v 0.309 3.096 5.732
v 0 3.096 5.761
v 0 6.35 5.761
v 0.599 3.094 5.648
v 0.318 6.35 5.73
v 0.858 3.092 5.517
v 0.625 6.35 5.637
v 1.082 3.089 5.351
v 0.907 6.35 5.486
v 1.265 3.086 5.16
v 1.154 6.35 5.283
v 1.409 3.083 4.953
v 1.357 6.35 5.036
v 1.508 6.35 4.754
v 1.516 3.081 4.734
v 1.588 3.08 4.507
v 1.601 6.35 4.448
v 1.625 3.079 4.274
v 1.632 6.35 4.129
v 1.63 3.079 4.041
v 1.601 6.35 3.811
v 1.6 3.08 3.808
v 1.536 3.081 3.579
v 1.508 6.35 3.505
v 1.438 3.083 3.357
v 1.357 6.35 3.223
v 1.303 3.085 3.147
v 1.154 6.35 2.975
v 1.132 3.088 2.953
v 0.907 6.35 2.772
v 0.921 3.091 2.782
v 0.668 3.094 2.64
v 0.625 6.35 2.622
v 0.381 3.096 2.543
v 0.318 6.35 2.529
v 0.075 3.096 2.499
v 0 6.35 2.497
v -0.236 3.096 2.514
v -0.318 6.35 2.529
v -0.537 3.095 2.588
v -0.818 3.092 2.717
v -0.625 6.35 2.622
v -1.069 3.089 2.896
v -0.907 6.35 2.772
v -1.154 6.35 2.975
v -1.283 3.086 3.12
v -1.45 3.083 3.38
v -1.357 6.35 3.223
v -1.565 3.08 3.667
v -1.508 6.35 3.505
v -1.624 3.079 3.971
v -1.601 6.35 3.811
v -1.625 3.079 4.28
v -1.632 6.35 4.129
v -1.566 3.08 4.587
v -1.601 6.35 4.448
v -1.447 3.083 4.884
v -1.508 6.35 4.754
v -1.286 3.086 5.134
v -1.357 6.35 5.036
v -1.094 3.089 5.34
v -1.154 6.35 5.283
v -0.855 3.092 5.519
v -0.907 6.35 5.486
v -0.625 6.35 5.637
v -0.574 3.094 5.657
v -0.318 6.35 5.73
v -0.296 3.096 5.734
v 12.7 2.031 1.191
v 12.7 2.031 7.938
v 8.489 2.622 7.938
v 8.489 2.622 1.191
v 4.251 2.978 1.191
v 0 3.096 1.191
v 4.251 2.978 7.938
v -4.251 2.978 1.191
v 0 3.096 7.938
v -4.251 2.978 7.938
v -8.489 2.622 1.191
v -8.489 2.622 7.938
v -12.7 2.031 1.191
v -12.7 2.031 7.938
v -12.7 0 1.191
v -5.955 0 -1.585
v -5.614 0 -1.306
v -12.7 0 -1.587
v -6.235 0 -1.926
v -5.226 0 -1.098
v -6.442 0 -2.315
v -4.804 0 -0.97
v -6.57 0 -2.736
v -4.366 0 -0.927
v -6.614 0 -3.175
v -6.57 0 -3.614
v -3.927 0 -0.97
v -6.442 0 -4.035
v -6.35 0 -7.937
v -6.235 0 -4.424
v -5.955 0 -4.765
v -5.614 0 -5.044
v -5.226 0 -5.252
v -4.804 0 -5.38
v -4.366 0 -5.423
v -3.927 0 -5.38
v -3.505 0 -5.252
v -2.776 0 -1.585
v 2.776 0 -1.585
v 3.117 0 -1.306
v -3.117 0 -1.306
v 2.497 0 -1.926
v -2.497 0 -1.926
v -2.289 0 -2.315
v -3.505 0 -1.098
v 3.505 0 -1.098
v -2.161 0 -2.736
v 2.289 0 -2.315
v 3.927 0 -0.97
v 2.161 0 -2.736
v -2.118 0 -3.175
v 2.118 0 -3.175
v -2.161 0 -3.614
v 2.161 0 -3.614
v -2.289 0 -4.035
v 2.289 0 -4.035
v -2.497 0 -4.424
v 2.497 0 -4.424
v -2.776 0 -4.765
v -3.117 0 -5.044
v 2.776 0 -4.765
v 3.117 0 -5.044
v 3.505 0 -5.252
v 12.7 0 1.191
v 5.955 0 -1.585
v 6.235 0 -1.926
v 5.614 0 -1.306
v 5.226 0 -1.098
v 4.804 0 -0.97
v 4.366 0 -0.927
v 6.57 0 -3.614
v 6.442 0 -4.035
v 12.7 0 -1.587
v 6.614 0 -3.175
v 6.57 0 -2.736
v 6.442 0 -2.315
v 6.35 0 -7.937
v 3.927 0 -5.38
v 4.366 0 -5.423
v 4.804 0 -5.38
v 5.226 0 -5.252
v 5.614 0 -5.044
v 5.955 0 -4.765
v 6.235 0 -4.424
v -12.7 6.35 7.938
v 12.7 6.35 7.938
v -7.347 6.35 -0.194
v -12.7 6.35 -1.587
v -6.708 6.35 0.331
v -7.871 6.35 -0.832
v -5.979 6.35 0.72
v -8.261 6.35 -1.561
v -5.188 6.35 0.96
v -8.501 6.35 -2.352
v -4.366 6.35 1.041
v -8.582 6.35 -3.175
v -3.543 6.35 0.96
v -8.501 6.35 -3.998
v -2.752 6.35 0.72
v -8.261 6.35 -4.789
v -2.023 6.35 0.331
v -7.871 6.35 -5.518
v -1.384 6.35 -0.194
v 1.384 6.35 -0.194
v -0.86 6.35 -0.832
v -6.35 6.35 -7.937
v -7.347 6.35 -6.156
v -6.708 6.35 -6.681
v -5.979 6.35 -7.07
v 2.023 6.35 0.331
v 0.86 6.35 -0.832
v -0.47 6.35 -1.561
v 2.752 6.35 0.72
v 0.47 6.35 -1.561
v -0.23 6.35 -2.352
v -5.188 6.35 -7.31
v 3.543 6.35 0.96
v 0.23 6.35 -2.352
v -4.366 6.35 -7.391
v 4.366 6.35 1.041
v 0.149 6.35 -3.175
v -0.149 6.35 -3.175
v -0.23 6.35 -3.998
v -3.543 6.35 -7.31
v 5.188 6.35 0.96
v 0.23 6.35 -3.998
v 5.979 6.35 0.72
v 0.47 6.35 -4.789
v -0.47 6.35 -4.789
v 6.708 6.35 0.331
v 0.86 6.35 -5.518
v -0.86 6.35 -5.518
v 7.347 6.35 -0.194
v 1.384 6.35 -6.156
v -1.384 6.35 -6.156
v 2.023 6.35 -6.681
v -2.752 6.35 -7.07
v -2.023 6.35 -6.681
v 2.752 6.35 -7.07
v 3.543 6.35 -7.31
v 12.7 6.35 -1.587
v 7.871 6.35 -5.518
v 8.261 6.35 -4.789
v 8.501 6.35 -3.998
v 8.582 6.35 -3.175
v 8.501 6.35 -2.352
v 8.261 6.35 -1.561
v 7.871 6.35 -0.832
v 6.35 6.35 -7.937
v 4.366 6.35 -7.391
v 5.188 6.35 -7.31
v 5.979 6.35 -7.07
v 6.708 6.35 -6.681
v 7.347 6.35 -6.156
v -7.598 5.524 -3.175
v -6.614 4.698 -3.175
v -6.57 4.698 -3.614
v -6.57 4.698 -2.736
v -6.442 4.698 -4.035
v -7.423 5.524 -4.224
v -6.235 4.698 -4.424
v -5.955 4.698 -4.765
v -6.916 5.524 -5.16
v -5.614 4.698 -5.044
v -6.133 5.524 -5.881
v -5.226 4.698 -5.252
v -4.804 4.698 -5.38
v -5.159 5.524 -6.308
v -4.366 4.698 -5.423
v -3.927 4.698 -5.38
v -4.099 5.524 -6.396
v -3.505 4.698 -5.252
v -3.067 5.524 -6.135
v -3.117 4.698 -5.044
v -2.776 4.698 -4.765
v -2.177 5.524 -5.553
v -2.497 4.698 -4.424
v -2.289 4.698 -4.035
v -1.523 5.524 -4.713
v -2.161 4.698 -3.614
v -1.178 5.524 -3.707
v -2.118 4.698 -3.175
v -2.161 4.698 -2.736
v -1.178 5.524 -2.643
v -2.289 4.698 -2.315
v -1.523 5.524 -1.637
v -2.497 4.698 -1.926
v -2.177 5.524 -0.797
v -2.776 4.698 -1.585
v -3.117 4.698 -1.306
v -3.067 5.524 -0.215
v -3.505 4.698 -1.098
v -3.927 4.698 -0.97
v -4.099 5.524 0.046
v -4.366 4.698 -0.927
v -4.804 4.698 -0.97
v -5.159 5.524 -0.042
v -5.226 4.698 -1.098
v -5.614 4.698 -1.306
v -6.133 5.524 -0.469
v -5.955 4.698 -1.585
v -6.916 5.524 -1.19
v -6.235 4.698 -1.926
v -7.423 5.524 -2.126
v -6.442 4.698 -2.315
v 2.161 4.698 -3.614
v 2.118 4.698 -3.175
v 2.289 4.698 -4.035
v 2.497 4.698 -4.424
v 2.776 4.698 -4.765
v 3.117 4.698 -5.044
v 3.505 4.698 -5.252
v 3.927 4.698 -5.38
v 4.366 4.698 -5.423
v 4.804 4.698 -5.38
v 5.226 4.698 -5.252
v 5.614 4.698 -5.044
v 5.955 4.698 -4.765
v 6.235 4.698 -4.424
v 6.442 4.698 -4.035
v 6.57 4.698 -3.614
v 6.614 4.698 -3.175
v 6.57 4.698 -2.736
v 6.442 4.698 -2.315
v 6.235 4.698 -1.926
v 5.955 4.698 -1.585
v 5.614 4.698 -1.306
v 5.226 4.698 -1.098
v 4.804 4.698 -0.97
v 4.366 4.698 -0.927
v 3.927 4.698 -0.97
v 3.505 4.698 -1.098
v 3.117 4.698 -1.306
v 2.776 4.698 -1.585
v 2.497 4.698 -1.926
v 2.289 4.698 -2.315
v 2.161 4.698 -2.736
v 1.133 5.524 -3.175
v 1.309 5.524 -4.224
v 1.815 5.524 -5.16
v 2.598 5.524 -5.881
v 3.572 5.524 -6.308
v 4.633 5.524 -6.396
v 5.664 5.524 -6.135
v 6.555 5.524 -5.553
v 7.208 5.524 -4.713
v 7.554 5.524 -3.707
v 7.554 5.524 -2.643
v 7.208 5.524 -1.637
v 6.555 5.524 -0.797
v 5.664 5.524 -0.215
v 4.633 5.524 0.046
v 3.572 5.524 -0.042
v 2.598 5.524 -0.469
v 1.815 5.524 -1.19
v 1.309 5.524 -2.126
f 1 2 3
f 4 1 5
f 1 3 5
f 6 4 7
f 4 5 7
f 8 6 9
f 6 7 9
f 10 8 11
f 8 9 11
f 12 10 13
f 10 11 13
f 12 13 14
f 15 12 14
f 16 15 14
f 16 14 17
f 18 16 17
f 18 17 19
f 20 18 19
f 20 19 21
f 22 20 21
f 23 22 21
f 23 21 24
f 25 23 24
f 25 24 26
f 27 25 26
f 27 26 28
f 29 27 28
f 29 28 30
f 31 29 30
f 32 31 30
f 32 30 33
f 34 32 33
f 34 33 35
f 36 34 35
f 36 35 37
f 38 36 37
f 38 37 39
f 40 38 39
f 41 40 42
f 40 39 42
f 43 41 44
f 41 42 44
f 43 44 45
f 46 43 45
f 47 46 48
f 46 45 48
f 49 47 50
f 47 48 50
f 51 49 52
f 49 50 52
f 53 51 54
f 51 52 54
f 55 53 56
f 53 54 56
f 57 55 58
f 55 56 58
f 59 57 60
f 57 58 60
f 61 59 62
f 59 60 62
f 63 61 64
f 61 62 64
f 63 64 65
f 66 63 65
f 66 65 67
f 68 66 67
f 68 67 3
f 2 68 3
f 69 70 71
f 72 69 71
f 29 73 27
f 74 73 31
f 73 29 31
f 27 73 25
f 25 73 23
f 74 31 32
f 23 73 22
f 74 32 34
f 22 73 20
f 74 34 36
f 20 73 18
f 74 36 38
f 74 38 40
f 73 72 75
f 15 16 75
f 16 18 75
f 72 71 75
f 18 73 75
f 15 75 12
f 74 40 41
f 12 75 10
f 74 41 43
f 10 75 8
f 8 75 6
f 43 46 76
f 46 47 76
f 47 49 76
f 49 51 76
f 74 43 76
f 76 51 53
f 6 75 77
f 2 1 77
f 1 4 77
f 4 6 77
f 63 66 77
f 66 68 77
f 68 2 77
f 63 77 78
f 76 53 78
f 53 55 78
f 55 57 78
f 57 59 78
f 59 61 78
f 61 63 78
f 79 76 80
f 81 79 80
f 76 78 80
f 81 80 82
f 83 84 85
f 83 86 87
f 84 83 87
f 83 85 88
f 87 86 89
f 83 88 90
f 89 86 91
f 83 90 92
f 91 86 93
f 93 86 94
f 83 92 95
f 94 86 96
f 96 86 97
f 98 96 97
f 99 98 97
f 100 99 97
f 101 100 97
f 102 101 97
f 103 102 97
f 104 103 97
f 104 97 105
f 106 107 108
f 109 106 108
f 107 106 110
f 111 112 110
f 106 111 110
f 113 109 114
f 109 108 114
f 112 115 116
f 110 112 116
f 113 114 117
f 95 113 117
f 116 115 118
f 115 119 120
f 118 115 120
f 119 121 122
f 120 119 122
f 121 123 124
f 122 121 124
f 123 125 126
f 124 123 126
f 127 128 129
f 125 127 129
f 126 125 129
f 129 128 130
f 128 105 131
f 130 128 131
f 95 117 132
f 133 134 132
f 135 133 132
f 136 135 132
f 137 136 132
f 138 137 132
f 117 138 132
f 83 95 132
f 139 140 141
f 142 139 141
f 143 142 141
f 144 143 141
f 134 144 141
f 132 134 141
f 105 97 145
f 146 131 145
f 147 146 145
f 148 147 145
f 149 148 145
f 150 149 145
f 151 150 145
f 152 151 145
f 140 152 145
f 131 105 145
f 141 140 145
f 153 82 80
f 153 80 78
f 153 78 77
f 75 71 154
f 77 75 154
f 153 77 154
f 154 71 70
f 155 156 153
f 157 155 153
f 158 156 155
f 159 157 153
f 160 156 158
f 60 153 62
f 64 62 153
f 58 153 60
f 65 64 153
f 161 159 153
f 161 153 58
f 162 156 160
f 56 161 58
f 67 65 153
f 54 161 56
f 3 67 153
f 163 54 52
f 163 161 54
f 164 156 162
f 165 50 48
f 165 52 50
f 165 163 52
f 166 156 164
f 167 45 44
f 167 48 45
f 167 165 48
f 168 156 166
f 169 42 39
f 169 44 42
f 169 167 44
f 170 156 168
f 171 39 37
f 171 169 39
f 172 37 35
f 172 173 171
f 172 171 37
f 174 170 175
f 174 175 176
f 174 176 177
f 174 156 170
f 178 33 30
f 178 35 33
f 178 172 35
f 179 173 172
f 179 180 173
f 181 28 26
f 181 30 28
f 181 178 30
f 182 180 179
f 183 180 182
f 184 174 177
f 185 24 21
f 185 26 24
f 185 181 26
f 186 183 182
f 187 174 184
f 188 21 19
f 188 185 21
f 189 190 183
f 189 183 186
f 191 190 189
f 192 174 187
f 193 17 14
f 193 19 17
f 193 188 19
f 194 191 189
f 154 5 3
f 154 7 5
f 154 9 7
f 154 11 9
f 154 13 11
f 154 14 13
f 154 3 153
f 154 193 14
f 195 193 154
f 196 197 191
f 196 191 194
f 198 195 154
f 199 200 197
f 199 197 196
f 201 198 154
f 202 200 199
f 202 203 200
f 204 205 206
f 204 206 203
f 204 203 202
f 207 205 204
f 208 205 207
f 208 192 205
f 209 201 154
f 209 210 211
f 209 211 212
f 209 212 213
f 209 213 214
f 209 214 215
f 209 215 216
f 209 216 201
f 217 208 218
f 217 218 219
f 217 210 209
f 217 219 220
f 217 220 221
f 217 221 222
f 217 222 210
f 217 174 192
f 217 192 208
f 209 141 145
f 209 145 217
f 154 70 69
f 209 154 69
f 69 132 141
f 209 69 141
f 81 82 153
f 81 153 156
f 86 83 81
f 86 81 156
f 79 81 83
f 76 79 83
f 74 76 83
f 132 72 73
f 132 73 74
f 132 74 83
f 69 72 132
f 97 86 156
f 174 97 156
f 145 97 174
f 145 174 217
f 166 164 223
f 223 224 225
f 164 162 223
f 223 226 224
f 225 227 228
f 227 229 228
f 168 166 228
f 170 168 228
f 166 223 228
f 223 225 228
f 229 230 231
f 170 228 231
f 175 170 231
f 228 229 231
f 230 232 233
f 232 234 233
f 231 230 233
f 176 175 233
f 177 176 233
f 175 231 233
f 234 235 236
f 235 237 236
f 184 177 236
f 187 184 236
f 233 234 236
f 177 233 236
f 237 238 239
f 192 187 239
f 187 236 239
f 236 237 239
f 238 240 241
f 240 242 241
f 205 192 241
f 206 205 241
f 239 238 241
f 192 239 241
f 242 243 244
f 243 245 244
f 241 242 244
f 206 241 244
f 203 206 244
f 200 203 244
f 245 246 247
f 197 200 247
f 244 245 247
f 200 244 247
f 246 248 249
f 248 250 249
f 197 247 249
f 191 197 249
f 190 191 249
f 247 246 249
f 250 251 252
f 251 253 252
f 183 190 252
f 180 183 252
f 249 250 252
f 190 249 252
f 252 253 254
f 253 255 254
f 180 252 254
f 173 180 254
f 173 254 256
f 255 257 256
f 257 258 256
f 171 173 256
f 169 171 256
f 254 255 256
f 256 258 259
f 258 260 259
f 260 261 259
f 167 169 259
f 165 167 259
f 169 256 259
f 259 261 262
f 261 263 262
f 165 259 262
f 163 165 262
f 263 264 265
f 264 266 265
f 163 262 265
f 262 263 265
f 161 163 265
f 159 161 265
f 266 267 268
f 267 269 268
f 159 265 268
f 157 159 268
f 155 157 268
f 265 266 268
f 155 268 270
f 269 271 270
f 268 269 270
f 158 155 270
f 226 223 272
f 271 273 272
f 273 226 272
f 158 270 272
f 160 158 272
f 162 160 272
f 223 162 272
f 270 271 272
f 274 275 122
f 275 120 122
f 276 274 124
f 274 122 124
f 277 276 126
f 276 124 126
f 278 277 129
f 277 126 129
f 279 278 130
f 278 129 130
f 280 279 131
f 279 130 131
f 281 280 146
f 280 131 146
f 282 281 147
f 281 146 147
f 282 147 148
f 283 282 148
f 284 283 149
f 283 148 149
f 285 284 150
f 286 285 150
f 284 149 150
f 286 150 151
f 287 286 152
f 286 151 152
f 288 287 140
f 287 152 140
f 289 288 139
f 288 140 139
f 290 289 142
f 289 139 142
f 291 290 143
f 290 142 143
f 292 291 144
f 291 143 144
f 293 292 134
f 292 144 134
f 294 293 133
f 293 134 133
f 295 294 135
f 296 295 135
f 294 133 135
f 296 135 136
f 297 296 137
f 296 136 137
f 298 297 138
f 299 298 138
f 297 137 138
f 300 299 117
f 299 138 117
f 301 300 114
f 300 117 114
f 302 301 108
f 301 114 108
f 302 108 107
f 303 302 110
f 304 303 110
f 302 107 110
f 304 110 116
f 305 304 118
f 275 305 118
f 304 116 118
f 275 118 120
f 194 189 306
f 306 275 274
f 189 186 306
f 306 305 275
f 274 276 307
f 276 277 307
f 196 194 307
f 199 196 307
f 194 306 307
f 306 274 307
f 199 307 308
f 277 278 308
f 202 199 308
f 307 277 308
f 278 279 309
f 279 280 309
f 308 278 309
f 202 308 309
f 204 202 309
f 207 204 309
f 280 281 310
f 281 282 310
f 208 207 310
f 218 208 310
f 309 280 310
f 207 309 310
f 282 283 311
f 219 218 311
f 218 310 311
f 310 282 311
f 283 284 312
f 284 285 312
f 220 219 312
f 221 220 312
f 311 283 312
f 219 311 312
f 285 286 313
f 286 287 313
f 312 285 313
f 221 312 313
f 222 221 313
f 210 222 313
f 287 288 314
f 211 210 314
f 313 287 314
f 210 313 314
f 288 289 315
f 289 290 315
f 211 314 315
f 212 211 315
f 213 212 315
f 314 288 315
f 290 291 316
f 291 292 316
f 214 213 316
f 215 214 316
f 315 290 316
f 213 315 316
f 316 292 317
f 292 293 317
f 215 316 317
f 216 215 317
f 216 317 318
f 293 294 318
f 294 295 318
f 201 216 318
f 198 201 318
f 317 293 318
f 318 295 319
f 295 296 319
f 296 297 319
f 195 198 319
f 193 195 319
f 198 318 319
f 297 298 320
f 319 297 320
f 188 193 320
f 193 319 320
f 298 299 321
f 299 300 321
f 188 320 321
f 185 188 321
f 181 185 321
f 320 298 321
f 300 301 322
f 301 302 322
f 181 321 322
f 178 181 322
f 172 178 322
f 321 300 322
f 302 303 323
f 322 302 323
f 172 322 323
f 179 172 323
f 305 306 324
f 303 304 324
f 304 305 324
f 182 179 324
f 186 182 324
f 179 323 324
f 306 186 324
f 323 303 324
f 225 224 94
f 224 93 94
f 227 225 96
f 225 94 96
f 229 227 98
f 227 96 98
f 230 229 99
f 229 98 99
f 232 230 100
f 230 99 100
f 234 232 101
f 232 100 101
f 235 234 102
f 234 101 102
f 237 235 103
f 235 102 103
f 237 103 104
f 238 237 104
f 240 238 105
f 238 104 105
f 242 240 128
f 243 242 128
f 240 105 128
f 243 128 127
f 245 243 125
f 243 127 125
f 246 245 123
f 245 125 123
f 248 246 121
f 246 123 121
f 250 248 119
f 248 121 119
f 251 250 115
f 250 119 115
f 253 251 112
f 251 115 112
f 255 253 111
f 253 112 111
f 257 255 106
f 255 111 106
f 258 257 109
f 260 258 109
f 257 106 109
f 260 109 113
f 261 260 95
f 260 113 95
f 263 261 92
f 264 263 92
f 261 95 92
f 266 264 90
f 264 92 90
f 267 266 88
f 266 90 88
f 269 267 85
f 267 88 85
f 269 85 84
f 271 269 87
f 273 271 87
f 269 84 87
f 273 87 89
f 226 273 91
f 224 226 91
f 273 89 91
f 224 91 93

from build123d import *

# Parameters (mm, degrees)
SKETCH1_W                                         = 25.4
SKETCH1_H                                         = 15.875
BOSS_EXTRUDE1_DEPTH                               = 6.35
CHAMFER1_SIZE                                     = 6.35
CUT_EXTRUDE1_DEPTH                                = 6.746875
SKETCH3_R                                         = 1.63195
CUT_EXTRUDE2_DEPTH                                = 17.267034341
CSK_FOR_8_FLAT_HEAD_MACHINE_SCREW_100_D           = 4.4958
CSK_FOR_8_FLAT_HEAD_MACHINE_SCREW_100_CSINK_D     = 8.4328
CSK_FOR_8_FLAT_HEAD_MACHINE_SCREW_100_CSINK_ANGLE = 100


with BuildPart() as part:
    # Sketch1 → Boss-Extrude1 (new body)
    with BuildSketch(Plane(origin=(0, 0, 0), x_dir=(1, 0, 0), z_dir=(0, 1, 0))):
        Rectangle(SKETCH1_W, SKETCH1_H)
    extrude(amount=BOSS_EXTRUDE1_DEPTH)

    # Chamfer1
    chamfer1_edges = [part.edges().sort_by_distance(p)[0] for p in [
        (-12.7, 3.175, -7.9375),
        (12.7, 3.175, -7.9375),
    ]]
    chamfer(chamfer1_edges, length=CHAMFER1_SIZE)

    # Sketch2 → Cut-Extrude1 (cut)
    with BuildSketch(Plane.XY.offset(7.9375)):
        with BuildLine():
            Line((-12.7, 2.030696103), (-12.7, 0))
            Line((-12.7, 0), (12.7, 0))
            Line((12.7, 0), (12.7, 2.030696103))
            ThreePointArc((12.7, 2.030696103), (0, 3.096482857), (-12.7, 2.030696103))
        make_face()
    extrude(amount=-CUT_EXTRUDE1_DEPTH, mode=Mode.SUBTRACT)

    # Sketch3 → Cut-Extrude2 (cut, through all)
    with BuildSketch(Plane(origin=(0, 6.35, 0), x_dir=(1, 0, 0), z_dir=(0, 1, 0))):
        with Locations(Location((0, -4.129280278, 0), (0, 0, 270))):
            Circle(SKETCH3_R)
    extrude(amount=-CUT_EXTRUDE2_DEPTH, mode=Mode.SUBTRACT)

    # CSK for #8 Flat Head Machine Screw (100)1 (through all)
    with Locations(Plane(origin=(0, 6.35, 0), x_dir=(1, 0, 0), z_dir=(0, 1, 0))):
        with Locations((-4.365625, 3.175), (4.365625, 3.175)):
            CounterSinkHole(CSK_FOR_8_FLAT_HEAD_MACHINE_SCREW_100_D / 2, CSK_FOR_8_FLAT_HEAD_MACHINE_SCREW_100_CSINK_D / 2, counter_sink_angle=CSK_FOR_8_FLAT_HEAD_MACHINE_SCREW_100_CSINK_ANGLE)


solid = part.part
